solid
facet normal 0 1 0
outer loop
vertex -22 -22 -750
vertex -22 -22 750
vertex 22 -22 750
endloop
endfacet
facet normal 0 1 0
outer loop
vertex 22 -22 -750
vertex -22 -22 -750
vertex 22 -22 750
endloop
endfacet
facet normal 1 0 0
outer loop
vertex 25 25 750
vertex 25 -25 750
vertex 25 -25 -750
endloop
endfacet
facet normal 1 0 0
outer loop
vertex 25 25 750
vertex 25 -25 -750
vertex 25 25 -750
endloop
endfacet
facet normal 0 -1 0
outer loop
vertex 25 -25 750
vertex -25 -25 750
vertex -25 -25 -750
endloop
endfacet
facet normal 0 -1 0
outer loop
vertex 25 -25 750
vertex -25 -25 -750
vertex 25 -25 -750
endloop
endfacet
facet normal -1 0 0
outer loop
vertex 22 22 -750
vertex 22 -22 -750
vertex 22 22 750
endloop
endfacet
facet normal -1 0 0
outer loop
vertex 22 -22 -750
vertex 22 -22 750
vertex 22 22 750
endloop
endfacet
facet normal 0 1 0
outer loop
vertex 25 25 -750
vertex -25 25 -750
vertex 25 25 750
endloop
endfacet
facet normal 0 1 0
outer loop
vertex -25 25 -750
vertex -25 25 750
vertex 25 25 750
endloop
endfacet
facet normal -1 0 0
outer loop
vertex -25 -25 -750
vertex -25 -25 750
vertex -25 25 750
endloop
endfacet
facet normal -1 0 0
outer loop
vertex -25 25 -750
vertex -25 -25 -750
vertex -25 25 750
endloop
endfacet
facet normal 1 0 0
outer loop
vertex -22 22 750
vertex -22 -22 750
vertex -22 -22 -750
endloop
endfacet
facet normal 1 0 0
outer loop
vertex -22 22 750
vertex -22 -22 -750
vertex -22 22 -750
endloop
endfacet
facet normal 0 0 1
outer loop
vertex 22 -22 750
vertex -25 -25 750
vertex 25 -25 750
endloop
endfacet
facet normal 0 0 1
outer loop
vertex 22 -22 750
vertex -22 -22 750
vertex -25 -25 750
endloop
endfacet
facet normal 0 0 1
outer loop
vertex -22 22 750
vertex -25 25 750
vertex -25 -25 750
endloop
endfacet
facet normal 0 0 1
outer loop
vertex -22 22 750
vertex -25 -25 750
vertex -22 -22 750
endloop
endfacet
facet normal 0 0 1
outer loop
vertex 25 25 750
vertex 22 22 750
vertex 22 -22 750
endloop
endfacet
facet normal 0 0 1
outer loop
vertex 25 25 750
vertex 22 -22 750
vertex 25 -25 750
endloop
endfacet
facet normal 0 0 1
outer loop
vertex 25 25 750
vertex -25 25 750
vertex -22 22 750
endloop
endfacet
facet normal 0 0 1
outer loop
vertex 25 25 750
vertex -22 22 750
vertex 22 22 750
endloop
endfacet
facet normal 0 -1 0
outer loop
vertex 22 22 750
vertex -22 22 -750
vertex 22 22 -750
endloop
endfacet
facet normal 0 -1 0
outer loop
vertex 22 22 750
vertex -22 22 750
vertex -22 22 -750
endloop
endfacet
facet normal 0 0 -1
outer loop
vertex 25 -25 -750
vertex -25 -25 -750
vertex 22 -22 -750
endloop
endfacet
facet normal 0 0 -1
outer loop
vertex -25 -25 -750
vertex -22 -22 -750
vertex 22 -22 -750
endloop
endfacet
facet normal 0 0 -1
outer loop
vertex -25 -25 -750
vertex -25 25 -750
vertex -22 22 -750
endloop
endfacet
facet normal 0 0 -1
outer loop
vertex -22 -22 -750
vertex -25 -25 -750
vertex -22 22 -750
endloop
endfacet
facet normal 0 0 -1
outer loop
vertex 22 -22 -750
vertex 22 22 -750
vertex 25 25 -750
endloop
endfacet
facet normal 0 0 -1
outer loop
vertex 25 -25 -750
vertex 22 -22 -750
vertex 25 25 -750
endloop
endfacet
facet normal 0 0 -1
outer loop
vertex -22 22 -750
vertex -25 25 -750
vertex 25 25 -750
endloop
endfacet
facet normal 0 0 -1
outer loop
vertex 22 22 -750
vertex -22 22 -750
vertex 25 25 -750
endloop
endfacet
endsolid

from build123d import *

# Parameters (mm, degrees)
CROQUIS1_W              = 50
CROQUIS1_H              = 50
CROQUIS1_W_2            = 44
CROQUIS1_H_2            = 44
SALIENTE_EXTRUIR1_DEPTH = 750


with BuildPart() as part:
    # Croquis1 → Saliente-Extruir1 (new, symmetric)
    with BuildSketch(Plane.XY):
        Rectangle(CROQUIS1_W, CROQUIS1_H)
        Rectangle(CROQUIS1_W_2, CROQUIS1_H_2, mode=Mode.SUBTRACT)
    extrude(amount=SALIENTE_EXTRUIR1_DEPTH, both=True)


solid = part.part
